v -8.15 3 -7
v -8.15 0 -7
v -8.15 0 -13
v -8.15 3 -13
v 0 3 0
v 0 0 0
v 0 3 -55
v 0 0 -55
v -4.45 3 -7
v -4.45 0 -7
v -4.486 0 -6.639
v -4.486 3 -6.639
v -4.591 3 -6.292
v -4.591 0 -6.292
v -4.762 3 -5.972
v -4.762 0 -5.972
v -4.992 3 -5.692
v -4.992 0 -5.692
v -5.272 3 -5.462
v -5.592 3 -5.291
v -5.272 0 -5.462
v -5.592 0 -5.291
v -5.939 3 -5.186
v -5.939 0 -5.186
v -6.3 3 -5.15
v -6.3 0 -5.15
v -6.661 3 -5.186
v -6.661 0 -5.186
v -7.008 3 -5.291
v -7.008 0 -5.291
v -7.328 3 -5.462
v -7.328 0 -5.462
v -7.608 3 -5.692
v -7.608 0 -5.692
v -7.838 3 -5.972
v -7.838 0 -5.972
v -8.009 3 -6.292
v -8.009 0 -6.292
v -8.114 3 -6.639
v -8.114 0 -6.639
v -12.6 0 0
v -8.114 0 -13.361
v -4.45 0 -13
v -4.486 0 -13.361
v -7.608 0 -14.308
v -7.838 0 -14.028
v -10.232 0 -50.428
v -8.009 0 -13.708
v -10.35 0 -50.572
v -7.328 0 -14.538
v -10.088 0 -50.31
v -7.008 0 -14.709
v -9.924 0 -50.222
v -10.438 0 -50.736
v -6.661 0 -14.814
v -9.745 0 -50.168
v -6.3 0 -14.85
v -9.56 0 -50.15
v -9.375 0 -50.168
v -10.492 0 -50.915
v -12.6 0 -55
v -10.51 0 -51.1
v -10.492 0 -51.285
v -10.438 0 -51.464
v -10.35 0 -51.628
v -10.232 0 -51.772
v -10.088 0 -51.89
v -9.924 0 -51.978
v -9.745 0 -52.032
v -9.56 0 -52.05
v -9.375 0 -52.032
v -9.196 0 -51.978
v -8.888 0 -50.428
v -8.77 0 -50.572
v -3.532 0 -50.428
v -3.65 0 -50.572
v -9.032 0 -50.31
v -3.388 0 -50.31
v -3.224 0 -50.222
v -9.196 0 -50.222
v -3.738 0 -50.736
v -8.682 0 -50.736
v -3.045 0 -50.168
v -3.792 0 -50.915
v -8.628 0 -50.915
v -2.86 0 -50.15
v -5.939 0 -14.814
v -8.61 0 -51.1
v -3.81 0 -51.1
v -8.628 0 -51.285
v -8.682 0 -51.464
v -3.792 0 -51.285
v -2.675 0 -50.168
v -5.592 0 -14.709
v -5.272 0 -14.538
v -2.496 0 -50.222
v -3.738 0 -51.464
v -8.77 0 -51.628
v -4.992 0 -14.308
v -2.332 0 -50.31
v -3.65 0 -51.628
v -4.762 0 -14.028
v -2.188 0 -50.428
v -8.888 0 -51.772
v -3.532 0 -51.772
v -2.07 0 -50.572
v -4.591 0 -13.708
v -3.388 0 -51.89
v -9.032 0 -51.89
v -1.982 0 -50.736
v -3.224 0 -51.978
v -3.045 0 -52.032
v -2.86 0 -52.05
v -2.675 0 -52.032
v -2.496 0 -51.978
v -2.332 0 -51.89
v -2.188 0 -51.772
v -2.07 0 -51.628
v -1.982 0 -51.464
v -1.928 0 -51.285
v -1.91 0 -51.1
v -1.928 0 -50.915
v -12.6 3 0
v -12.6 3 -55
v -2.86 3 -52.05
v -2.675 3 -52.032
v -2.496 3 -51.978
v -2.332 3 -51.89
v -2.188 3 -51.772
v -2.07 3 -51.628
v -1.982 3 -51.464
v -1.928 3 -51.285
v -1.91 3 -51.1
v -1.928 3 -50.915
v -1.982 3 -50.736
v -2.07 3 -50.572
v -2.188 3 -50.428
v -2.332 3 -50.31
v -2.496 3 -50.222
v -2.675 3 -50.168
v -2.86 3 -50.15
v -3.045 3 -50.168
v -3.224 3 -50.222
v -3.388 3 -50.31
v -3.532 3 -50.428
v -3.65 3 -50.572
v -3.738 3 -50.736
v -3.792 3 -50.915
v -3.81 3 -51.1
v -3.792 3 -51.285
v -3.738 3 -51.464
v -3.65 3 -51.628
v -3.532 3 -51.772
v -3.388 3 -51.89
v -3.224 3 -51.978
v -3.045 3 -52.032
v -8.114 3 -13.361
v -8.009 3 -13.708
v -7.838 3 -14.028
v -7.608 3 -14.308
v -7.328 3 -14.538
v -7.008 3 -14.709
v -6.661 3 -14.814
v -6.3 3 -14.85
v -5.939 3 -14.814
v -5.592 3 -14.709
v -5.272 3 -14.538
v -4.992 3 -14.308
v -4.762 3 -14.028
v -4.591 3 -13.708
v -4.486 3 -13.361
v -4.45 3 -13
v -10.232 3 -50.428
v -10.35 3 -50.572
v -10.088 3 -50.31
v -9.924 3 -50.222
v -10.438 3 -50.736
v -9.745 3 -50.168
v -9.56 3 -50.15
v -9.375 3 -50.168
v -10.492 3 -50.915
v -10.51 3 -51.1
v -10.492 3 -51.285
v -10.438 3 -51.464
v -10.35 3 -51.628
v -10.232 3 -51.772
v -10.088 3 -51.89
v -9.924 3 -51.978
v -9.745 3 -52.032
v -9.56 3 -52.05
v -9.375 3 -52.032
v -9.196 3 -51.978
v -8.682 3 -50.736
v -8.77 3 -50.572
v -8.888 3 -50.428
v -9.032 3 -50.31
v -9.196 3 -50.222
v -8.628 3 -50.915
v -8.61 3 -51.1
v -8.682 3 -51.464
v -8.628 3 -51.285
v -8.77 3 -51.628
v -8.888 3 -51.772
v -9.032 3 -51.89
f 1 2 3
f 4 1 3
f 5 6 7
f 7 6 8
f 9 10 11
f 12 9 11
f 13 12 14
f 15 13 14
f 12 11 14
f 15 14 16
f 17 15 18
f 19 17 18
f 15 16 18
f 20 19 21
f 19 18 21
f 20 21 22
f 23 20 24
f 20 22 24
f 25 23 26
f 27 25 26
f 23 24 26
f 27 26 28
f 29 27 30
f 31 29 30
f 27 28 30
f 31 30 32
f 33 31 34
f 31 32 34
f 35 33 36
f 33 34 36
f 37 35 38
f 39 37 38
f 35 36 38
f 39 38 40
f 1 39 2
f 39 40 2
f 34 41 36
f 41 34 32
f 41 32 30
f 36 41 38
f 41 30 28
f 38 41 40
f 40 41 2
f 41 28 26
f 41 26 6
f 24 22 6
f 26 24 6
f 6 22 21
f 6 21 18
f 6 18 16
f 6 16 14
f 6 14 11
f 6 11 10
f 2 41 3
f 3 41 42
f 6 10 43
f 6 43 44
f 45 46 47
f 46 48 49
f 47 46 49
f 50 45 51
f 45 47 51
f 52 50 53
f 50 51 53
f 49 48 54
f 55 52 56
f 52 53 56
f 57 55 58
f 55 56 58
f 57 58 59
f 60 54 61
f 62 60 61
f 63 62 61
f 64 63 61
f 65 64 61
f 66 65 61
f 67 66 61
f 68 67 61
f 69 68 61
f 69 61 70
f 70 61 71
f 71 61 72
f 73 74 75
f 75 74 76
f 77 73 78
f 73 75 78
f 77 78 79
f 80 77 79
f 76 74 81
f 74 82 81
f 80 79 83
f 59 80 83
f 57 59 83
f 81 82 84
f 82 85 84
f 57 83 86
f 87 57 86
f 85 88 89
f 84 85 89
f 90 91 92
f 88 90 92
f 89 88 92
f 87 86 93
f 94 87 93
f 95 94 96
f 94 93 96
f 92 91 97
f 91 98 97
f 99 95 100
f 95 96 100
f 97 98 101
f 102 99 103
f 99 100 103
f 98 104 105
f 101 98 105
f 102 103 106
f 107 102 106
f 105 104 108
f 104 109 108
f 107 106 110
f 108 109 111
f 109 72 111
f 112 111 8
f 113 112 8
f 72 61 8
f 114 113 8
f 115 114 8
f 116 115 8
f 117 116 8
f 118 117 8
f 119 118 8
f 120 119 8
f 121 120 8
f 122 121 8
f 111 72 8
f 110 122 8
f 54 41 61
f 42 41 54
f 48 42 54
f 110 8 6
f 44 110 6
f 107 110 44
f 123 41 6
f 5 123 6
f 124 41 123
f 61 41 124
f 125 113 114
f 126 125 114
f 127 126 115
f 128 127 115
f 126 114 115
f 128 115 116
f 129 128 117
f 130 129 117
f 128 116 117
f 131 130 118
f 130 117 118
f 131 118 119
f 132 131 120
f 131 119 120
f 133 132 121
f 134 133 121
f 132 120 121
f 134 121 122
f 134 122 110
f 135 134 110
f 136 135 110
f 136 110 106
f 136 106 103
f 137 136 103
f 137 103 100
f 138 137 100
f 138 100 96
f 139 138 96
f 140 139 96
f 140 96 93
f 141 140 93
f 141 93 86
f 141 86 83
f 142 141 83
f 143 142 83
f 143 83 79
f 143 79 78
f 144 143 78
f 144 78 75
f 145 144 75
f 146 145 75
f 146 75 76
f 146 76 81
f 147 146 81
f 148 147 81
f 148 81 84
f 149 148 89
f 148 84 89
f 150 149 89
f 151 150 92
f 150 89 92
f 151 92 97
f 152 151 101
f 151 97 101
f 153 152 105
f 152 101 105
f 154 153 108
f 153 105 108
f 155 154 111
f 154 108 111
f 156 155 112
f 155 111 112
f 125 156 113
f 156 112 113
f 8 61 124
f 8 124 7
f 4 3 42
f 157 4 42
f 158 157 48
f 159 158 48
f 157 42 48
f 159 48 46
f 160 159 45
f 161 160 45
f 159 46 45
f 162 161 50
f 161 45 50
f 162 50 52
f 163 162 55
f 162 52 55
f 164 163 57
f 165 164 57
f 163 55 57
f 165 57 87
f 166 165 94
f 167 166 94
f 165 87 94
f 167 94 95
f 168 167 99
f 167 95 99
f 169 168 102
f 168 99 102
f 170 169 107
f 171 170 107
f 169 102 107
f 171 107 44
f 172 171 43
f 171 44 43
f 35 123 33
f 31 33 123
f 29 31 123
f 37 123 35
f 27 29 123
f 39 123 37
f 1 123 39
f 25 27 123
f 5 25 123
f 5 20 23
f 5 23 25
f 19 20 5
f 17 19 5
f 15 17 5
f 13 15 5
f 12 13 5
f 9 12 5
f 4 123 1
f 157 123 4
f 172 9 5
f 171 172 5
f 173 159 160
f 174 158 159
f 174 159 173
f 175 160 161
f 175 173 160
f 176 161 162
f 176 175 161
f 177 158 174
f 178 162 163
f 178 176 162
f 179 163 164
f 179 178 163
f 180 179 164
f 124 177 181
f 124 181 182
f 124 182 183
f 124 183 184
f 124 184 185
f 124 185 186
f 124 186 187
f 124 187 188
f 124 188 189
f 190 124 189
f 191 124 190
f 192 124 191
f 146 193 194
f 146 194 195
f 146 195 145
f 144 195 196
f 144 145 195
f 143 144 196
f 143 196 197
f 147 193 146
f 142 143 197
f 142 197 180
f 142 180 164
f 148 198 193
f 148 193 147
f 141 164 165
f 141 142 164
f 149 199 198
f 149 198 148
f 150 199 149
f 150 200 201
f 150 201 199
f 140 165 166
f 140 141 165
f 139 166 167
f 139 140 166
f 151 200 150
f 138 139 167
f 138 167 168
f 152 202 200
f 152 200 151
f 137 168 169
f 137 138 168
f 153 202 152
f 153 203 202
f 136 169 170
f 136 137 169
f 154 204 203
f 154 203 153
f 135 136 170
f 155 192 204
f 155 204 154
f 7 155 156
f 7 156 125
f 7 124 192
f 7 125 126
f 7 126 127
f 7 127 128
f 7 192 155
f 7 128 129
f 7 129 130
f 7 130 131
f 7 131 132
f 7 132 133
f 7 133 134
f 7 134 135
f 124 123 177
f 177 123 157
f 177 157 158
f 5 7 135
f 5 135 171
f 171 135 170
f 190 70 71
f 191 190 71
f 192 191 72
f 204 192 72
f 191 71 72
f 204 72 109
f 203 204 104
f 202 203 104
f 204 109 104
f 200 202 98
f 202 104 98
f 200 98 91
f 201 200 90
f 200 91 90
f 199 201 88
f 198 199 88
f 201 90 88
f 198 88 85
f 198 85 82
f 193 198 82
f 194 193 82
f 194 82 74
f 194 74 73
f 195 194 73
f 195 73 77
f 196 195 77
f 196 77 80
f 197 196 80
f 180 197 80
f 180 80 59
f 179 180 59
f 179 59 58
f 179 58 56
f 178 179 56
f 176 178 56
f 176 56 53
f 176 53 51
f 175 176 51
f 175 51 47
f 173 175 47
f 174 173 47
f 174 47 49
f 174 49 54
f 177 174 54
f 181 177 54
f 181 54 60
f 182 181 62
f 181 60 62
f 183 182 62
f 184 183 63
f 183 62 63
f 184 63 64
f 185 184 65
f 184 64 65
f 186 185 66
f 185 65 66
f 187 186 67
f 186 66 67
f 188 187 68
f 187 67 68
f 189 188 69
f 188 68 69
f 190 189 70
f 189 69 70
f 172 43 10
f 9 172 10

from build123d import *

# Parameters (mm, degrees)
SKETCH1_W           = 12.6
SKETCH1_H           = 55
BOSS_EXTRUDE1_DEPTH = 3
SKETCH2_R           = 0.95
CUT_EXTRUDE1_DEPTH  = 57.504513094


with BuildPart() as part:
    # Sketch1 → Boss-Extrude1 (new body)
    with BuildSketch(Plane(origin=(0, 0, 0), x_dir=(1, 0, 0), z_dir=(0, 1, 0))):
        with Locations((-6.3, 27.5)):
            Rectangle(SKETCH1_W, SKETCH1_H)
        with BuildLine():
            Line((-8.15, 7), (-8.15, 13))
            ThreePointArc((-8.15, 13), (-6.3, 14.85), (-4.45, 13))
            Line((-4.45, 13), (-4.45, 7))
            ThreePointArc((-4.45, 7), (-6.3, 5.15), (-8.15, 7))
        make_face(mode=Mode.SUBTRACT)
    extrude(amount=BOSS_EXTRUDE1_DEPTH)

    # Sketch2 → Cut-Extrude1 (cut, through all)
    with BuildSketch(Plane.XZ):
        with Locations(Location((-2.86, -51.1, 0), (0, 0, 270))):
            Circle(SKETCH2_R)
        with Locations(Location((-9.56, -51.1, 0), (0, 0, 270))):
            Circle(SKETCH2_R)
    extrude(amount=-CUT_EXTRUDE1_DEPTH, mode=Mode.SUBTRACT)


solid = part.part
